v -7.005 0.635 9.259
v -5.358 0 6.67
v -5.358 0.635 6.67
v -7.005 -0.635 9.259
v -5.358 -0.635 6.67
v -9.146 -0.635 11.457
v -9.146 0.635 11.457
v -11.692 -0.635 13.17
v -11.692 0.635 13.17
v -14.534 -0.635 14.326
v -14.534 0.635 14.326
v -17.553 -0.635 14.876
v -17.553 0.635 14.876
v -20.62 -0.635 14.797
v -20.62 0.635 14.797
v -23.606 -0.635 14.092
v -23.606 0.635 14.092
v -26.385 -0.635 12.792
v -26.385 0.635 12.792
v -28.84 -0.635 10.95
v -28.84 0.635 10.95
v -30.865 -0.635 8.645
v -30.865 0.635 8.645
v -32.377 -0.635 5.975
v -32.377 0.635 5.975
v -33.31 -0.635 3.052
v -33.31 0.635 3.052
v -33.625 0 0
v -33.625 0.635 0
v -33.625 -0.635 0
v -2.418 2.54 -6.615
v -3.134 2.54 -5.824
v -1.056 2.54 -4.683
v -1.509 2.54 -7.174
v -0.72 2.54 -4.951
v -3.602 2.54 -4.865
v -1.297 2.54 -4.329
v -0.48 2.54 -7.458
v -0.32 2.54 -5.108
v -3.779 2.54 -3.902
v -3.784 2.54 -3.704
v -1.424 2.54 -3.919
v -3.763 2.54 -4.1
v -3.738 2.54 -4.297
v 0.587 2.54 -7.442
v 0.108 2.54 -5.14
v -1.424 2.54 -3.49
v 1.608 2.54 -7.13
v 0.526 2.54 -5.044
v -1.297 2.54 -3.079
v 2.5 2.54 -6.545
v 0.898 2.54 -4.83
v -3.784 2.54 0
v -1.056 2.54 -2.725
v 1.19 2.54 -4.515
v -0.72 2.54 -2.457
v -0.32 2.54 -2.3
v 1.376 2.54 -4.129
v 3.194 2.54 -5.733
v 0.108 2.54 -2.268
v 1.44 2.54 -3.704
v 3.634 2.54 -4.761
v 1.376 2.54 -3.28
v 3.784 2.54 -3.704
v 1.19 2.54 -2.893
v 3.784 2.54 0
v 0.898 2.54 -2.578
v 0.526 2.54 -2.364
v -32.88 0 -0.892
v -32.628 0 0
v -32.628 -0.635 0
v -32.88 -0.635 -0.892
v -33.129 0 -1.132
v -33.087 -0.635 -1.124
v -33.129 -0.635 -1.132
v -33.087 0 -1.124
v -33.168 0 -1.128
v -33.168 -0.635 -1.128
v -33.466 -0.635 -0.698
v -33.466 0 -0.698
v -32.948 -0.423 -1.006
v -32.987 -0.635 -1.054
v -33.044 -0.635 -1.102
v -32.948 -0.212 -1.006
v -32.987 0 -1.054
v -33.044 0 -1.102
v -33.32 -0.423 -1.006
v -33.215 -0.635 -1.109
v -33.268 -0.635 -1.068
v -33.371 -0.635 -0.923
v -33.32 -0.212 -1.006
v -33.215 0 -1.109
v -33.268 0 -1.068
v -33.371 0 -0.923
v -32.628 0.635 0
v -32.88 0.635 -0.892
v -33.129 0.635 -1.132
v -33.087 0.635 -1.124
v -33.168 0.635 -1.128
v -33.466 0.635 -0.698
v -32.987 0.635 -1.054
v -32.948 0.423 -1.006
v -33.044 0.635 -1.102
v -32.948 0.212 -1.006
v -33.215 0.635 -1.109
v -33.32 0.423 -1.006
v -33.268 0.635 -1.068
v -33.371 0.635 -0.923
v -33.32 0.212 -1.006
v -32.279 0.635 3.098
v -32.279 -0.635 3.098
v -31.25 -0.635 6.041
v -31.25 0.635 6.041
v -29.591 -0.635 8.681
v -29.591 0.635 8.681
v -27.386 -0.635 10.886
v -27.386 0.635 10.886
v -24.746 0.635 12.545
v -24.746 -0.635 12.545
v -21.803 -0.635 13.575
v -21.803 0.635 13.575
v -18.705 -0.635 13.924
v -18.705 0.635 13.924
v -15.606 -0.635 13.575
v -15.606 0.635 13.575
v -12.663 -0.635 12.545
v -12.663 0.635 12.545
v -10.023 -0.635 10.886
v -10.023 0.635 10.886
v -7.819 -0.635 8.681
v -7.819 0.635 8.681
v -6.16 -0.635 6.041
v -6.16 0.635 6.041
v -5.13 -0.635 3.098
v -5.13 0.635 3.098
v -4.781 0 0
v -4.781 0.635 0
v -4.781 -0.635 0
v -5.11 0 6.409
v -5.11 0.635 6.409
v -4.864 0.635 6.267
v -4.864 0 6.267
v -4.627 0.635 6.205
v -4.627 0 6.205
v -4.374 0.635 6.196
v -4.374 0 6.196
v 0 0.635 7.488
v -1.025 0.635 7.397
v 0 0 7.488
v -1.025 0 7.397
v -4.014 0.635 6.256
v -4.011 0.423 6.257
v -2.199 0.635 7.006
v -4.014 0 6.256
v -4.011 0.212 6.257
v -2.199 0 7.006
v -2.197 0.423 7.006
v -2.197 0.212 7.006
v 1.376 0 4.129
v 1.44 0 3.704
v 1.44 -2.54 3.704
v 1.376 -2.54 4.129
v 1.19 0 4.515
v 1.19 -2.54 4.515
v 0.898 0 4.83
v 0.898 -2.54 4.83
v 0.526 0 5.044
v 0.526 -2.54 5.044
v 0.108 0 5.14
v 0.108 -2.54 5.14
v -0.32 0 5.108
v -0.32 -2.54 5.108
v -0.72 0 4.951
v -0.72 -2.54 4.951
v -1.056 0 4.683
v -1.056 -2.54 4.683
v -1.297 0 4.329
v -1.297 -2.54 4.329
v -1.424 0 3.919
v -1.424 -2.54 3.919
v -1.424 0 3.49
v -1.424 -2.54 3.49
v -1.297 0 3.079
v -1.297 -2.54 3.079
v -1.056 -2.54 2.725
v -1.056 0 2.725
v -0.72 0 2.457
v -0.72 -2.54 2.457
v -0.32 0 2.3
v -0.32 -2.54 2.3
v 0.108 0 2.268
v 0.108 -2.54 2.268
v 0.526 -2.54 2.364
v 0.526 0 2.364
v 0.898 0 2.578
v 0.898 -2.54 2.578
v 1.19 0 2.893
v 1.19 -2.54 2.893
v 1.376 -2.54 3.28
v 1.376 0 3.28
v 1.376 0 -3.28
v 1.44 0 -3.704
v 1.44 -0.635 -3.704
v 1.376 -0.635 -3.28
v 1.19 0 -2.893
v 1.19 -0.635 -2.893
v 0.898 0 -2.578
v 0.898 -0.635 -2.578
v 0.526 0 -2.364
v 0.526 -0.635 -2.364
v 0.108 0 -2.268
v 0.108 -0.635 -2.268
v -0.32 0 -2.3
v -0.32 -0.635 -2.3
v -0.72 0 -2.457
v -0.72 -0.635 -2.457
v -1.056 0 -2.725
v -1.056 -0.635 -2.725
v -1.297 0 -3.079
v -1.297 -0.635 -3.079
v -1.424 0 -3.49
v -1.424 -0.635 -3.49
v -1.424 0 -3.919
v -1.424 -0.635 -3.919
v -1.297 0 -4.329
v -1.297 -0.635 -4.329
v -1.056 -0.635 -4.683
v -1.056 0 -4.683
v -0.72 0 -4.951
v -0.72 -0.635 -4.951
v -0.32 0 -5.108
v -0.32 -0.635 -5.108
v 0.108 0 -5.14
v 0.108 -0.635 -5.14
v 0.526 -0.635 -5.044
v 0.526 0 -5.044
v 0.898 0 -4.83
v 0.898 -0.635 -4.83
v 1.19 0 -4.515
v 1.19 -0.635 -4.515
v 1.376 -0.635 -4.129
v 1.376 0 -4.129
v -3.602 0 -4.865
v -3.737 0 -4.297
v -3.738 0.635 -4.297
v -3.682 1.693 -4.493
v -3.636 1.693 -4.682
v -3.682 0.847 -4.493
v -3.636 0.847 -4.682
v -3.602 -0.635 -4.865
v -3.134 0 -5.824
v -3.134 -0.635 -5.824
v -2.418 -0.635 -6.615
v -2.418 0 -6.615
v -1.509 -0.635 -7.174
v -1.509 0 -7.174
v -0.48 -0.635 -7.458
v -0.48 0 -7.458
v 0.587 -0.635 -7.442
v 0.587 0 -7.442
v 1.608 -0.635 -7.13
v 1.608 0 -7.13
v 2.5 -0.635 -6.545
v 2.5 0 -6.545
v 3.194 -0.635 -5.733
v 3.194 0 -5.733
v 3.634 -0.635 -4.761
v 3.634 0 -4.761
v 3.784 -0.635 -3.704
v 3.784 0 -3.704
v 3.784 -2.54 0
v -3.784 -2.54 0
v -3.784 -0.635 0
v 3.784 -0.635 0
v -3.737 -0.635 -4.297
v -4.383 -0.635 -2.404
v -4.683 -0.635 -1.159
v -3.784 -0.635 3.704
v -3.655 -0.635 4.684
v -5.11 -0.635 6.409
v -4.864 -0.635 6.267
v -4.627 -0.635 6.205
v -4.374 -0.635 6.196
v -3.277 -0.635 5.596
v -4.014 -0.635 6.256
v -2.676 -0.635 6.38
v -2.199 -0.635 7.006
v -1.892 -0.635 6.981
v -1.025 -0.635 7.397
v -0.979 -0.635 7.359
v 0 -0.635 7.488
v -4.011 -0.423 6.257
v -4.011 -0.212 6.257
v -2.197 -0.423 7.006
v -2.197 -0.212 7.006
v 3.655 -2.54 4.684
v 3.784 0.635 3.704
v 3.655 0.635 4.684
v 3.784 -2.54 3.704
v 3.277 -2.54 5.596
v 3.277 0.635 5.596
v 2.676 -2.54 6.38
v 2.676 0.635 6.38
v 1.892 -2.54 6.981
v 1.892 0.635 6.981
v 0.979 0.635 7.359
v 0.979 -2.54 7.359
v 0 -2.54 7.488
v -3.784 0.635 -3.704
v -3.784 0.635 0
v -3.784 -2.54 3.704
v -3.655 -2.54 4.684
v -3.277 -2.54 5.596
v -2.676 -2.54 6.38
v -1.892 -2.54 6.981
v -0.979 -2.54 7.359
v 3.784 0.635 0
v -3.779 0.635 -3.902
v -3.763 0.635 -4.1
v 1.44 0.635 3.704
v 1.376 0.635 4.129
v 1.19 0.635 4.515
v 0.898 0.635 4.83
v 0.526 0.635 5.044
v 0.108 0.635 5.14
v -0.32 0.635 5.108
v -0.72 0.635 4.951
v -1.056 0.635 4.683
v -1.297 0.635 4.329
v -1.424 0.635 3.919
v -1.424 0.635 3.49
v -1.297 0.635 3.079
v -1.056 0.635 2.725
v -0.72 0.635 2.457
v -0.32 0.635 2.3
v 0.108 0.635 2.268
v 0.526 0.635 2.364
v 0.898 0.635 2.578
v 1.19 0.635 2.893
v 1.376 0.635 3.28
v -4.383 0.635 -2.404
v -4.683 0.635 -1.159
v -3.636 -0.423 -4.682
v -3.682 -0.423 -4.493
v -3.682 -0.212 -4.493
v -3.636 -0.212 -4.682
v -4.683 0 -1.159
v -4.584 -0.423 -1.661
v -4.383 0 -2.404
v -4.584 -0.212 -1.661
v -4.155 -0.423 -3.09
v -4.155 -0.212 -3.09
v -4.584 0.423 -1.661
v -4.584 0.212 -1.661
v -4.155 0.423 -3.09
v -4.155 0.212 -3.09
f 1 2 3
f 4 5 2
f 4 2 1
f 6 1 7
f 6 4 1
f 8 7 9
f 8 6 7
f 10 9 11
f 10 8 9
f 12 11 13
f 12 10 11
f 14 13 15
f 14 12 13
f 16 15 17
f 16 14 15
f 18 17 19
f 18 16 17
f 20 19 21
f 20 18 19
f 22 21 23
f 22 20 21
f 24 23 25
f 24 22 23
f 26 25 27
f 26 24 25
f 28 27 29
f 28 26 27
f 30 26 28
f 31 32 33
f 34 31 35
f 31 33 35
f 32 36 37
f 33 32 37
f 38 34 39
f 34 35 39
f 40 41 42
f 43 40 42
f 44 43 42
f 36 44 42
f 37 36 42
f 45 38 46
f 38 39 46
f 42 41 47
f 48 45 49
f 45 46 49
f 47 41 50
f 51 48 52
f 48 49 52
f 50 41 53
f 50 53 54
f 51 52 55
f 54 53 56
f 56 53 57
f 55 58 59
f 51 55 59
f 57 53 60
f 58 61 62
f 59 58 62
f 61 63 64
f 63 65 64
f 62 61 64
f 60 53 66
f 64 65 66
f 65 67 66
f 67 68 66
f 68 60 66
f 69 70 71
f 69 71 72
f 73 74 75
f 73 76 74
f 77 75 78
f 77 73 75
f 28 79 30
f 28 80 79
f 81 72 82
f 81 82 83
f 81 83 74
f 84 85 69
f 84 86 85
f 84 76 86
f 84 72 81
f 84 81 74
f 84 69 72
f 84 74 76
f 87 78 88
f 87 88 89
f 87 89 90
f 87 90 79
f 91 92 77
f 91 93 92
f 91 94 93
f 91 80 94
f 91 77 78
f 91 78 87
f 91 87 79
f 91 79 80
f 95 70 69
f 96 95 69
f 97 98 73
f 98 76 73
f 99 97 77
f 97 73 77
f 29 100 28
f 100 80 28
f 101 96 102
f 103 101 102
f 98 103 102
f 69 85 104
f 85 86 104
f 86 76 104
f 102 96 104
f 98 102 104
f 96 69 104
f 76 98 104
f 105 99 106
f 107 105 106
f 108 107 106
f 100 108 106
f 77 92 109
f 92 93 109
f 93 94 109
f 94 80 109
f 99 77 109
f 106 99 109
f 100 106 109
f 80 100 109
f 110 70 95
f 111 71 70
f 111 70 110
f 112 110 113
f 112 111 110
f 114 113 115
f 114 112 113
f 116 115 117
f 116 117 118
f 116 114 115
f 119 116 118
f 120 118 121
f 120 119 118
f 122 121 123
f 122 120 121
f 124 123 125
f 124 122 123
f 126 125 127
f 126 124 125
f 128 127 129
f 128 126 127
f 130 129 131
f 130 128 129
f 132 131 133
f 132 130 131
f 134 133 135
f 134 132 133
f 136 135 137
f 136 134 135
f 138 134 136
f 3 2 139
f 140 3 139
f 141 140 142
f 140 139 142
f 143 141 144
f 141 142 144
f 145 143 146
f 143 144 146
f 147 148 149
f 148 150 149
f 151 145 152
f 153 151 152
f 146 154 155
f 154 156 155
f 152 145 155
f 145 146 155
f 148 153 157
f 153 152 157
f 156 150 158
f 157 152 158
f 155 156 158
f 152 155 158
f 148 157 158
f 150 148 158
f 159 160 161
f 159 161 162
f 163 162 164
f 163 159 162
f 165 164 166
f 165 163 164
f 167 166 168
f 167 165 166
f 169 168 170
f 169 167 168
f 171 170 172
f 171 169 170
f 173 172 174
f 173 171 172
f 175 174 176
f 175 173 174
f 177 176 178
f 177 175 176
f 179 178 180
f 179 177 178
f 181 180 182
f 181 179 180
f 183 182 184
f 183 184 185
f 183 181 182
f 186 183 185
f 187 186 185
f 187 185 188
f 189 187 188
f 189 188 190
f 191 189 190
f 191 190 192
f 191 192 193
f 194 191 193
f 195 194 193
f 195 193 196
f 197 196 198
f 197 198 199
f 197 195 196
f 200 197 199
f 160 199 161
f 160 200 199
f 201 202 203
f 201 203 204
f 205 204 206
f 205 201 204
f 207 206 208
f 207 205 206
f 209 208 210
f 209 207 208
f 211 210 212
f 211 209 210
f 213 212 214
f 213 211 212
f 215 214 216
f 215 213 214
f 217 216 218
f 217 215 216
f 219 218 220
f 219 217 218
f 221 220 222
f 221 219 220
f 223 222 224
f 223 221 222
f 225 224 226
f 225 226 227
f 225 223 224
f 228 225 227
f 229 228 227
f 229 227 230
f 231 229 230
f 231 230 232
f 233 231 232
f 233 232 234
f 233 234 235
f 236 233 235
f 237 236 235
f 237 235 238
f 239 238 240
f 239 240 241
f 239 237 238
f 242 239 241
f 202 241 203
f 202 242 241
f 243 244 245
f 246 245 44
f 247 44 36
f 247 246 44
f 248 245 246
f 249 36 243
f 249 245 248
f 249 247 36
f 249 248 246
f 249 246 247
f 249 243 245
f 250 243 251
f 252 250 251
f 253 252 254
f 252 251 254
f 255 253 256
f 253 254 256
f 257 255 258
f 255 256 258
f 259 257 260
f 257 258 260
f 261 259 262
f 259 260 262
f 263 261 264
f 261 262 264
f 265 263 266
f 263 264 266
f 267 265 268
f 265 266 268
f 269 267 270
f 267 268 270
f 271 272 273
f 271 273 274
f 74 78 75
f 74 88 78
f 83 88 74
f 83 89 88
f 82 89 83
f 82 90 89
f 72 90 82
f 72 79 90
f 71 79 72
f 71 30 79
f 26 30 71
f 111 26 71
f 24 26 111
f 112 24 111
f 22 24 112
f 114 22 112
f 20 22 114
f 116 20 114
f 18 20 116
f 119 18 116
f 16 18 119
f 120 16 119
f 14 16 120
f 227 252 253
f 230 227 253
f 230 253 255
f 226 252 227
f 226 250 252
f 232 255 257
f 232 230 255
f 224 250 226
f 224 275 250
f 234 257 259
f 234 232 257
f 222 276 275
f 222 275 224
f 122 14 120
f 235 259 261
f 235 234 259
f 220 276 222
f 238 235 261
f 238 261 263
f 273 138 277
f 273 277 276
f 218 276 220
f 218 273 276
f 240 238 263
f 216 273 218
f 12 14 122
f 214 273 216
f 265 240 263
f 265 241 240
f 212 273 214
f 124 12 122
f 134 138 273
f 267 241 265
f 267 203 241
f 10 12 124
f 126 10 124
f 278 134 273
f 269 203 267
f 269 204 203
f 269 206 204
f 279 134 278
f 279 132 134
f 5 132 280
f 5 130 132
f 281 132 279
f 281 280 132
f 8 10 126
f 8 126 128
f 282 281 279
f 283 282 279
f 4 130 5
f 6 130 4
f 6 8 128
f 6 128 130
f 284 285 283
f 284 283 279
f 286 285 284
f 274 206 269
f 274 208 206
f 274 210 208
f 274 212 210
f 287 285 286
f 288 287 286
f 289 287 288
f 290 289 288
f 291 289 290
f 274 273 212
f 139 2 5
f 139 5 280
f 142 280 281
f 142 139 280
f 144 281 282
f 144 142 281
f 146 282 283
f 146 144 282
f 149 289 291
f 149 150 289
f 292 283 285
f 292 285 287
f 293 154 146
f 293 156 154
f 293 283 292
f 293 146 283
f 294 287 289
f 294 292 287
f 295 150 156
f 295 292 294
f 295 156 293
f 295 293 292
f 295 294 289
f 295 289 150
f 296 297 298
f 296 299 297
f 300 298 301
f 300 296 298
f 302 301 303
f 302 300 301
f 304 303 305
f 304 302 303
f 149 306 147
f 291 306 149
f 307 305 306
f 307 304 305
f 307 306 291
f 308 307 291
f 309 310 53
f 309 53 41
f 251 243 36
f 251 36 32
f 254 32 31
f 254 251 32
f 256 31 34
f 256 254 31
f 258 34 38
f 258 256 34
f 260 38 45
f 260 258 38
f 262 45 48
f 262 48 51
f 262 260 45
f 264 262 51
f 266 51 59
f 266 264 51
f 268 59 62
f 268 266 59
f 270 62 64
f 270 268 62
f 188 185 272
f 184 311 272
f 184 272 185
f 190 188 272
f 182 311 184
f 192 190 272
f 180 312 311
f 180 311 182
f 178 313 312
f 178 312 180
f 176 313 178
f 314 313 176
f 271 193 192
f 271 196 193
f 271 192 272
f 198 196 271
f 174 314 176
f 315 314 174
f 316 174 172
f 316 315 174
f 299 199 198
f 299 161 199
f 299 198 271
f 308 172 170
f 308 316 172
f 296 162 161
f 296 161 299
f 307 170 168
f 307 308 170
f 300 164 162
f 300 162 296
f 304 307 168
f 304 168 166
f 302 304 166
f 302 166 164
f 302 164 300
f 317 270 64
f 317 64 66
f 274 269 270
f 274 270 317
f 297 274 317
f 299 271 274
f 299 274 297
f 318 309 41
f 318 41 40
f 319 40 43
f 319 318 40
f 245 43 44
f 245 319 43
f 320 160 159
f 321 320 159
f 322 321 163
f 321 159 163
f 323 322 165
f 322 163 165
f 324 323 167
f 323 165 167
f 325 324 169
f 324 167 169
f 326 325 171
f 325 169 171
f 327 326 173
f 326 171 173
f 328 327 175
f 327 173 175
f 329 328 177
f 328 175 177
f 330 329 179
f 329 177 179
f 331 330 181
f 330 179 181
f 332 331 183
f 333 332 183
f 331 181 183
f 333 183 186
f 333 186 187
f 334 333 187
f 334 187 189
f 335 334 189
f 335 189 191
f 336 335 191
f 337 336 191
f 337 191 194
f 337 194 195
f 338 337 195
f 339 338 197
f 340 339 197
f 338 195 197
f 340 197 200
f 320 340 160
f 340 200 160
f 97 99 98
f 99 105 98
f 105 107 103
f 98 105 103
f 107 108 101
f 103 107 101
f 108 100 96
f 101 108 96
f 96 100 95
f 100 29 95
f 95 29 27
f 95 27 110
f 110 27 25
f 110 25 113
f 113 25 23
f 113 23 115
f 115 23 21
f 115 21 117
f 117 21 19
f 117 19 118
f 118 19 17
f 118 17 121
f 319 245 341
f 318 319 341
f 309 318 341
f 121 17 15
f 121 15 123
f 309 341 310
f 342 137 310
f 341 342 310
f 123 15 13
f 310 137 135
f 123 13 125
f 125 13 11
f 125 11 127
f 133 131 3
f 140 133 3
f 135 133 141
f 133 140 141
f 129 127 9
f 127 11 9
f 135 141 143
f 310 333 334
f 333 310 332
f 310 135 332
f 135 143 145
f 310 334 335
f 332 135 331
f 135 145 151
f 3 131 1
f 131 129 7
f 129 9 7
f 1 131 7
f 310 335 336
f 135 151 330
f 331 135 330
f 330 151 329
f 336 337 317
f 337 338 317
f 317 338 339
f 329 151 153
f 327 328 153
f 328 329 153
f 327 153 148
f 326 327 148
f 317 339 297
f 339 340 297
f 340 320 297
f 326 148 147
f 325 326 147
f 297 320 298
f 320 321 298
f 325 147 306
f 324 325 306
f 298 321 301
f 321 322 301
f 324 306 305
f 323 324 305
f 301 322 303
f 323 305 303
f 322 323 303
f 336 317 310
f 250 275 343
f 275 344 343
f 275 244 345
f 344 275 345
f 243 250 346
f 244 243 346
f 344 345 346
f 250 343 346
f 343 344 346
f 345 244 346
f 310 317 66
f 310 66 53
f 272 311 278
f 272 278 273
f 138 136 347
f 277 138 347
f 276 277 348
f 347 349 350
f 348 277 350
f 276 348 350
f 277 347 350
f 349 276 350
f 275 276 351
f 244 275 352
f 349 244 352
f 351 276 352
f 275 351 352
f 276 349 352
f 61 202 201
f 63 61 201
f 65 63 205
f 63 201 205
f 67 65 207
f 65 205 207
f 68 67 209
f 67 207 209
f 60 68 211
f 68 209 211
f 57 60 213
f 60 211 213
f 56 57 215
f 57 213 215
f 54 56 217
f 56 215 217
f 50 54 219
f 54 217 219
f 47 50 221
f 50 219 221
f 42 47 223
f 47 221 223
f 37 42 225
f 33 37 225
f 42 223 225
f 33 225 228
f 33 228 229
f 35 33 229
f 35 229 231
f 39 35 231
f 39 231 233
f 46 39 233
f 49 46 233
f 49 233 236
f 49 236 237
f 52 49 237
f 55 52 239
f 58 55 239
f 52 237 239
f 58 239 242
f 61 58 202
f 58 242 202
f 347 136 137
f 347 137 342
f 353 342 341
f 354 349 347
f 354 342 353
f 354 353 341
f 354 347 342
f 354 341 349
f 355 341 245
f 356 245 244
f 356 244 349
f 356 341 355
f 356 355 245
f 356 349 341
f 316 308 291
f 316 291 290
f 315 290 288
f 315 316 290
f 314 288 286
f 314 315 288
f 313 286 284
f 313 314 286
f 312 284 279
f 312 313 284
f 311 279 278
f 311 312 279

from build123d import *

# Parameters (mm, degrees)
F0_R          = 1.439889
F1_DEPTH      = 2.54
F1_DEPTH_BACK = 0.635
F2_DEPTH      = 0.635
F2_DEPTH_BACK = 2.54
F3_DEPTH      = 0.635
F3_DEPTH_BACK = 0.635


with BuildPart() as f1:
    # F0 (on Front) → F1 (new body, two sides)
    with BuildSketch(Plane.XZ) as f1_sk:
        with BuildLine():
            ThreePointArc((0, 7.488282), (-2.675809, 6.379925), (-3.784166, 3.704116))
            Line((-3.784166, 3.704116), (-3.784166, 0))
            Line((-3.784166, 0), (3.784166, 0))
            Line((3.784166, 0), (3.784166, 3.704116))
            ThreePointArc((3.784166, 3.704116), (2.675809, 6.379925), (0, 7.488282))
        make_face()
        with Locations((0, 3.704116)):
            Circle(F0_R, mode=Mode.SUBTRACT)
    extrude(amount=F1_DEPTH)
    extrude(f1_sk.sketch, amount=-F1_DEPTH_BACK)

    # F0 (on Front) → F2 (join, two sides)
    with BuildSketch(Plane.XZ) as f2_sk:
        with BuildLine():
            Line((3.784166, 0), (-3.784166, 0))
            Line((-3.784166, 0), (-3.784166, -3.704116))
            ThreePointArc((-3.784166, -3.704116), (-3.772481, -4.00126), (-3.7375, -4.296569))
            add(Edge.make_bspline(
                [(-3.7375, -4.296569), (-3.677352, -4.496531), (-3.629914, -4.685815), (-3.601814, -4.864653)],
                knots=[4.234155, 4.234155, 4.234155, 4.234155, 5.005496, 5.005496, 5.005496, 5.005496], degree=3))
            ThreePointArc((-3.601814, -4.864653), (0.587388, -7.442416), (3.784166, -3.704116))
            Line((3.784166, -3.704116), (3.784166, 0))
        make_face()
        with Locations((0, -3.704116)):
            Circle(F0_R, mode=Mode.SUBTRACT)
    extrude(amount=F2_DEPTH)
    extrude(f2_sk.sketch, amount=-F2_DEPTH_BACK)

    # F0 (on Front) → F3 (join, two sides)
    with BuildSketch(Plane.XZ) as f3_sk:
        with BuildLine():
            Line((-3.784166, 0), (-3.784166, 3.704116))
            ThreePointArc((-3.784166, 3.704116), (-2.675809, 6.379925), (0, 7.488282))
            add(Edge.make_bspline(
                [(-5.358132, 6.670184), (-4.27145, 5.197869), (-2.361172, 7.617555), (0, 7.488282)],
                knots=[0, 0, 0, 0, 5.420227, 5.420227, 5.420227, 5.420227], degree=3))
            ThreePointArc((-5.358132, 6.670184), (-4.182987, 3.426687), (-3.784166, 0))
        make_face()
        with BuildLine():
            Line((-3.784166, -3.704116), (-3.784166, 0))
            ThreePointArc((-3.784166, 0), (-4.182987, 3.426687), (-5.358132, 6.670184))
            ThreePointArc((-5.358132, 6.670184), (-22.131354, 14.52168), (-33.62517, 0))
            add(Edge.make_bspline(
                [(-32.628478, 0), (-32.883175, -1.509331), (-33.392582, -1.509331), (-33.62517, 0)],
                knots=[0, 0, 0, 0, 0.996692, 0.996692, 0.996692, 0.996692], degree=3))
            ThreePointArc((-32.628478, 0), (-18.704668, 13.92381), (-4.780858, 0))
            add(Edge.make_bspline(
                [(-4.780858, 0), (-4.780858, -1.779471), (-4.067676, -3.198905), (-3.7375, -4.296569)],
                knots=[0, 0, 0, 0, 4.234155, 4.234155, 4.234155, 4.234155], degree=3))
            ThreePointArc((-3.7375, -4.296569), (-3.772481, -4.00126), (-3.784166, -3.704116))
        make_face()
    extrude(amount=F3_DEPTH)
    extrude(f3_sk.sketch, amount=-F3_DEPTH_BACK)


solid = f1.part
